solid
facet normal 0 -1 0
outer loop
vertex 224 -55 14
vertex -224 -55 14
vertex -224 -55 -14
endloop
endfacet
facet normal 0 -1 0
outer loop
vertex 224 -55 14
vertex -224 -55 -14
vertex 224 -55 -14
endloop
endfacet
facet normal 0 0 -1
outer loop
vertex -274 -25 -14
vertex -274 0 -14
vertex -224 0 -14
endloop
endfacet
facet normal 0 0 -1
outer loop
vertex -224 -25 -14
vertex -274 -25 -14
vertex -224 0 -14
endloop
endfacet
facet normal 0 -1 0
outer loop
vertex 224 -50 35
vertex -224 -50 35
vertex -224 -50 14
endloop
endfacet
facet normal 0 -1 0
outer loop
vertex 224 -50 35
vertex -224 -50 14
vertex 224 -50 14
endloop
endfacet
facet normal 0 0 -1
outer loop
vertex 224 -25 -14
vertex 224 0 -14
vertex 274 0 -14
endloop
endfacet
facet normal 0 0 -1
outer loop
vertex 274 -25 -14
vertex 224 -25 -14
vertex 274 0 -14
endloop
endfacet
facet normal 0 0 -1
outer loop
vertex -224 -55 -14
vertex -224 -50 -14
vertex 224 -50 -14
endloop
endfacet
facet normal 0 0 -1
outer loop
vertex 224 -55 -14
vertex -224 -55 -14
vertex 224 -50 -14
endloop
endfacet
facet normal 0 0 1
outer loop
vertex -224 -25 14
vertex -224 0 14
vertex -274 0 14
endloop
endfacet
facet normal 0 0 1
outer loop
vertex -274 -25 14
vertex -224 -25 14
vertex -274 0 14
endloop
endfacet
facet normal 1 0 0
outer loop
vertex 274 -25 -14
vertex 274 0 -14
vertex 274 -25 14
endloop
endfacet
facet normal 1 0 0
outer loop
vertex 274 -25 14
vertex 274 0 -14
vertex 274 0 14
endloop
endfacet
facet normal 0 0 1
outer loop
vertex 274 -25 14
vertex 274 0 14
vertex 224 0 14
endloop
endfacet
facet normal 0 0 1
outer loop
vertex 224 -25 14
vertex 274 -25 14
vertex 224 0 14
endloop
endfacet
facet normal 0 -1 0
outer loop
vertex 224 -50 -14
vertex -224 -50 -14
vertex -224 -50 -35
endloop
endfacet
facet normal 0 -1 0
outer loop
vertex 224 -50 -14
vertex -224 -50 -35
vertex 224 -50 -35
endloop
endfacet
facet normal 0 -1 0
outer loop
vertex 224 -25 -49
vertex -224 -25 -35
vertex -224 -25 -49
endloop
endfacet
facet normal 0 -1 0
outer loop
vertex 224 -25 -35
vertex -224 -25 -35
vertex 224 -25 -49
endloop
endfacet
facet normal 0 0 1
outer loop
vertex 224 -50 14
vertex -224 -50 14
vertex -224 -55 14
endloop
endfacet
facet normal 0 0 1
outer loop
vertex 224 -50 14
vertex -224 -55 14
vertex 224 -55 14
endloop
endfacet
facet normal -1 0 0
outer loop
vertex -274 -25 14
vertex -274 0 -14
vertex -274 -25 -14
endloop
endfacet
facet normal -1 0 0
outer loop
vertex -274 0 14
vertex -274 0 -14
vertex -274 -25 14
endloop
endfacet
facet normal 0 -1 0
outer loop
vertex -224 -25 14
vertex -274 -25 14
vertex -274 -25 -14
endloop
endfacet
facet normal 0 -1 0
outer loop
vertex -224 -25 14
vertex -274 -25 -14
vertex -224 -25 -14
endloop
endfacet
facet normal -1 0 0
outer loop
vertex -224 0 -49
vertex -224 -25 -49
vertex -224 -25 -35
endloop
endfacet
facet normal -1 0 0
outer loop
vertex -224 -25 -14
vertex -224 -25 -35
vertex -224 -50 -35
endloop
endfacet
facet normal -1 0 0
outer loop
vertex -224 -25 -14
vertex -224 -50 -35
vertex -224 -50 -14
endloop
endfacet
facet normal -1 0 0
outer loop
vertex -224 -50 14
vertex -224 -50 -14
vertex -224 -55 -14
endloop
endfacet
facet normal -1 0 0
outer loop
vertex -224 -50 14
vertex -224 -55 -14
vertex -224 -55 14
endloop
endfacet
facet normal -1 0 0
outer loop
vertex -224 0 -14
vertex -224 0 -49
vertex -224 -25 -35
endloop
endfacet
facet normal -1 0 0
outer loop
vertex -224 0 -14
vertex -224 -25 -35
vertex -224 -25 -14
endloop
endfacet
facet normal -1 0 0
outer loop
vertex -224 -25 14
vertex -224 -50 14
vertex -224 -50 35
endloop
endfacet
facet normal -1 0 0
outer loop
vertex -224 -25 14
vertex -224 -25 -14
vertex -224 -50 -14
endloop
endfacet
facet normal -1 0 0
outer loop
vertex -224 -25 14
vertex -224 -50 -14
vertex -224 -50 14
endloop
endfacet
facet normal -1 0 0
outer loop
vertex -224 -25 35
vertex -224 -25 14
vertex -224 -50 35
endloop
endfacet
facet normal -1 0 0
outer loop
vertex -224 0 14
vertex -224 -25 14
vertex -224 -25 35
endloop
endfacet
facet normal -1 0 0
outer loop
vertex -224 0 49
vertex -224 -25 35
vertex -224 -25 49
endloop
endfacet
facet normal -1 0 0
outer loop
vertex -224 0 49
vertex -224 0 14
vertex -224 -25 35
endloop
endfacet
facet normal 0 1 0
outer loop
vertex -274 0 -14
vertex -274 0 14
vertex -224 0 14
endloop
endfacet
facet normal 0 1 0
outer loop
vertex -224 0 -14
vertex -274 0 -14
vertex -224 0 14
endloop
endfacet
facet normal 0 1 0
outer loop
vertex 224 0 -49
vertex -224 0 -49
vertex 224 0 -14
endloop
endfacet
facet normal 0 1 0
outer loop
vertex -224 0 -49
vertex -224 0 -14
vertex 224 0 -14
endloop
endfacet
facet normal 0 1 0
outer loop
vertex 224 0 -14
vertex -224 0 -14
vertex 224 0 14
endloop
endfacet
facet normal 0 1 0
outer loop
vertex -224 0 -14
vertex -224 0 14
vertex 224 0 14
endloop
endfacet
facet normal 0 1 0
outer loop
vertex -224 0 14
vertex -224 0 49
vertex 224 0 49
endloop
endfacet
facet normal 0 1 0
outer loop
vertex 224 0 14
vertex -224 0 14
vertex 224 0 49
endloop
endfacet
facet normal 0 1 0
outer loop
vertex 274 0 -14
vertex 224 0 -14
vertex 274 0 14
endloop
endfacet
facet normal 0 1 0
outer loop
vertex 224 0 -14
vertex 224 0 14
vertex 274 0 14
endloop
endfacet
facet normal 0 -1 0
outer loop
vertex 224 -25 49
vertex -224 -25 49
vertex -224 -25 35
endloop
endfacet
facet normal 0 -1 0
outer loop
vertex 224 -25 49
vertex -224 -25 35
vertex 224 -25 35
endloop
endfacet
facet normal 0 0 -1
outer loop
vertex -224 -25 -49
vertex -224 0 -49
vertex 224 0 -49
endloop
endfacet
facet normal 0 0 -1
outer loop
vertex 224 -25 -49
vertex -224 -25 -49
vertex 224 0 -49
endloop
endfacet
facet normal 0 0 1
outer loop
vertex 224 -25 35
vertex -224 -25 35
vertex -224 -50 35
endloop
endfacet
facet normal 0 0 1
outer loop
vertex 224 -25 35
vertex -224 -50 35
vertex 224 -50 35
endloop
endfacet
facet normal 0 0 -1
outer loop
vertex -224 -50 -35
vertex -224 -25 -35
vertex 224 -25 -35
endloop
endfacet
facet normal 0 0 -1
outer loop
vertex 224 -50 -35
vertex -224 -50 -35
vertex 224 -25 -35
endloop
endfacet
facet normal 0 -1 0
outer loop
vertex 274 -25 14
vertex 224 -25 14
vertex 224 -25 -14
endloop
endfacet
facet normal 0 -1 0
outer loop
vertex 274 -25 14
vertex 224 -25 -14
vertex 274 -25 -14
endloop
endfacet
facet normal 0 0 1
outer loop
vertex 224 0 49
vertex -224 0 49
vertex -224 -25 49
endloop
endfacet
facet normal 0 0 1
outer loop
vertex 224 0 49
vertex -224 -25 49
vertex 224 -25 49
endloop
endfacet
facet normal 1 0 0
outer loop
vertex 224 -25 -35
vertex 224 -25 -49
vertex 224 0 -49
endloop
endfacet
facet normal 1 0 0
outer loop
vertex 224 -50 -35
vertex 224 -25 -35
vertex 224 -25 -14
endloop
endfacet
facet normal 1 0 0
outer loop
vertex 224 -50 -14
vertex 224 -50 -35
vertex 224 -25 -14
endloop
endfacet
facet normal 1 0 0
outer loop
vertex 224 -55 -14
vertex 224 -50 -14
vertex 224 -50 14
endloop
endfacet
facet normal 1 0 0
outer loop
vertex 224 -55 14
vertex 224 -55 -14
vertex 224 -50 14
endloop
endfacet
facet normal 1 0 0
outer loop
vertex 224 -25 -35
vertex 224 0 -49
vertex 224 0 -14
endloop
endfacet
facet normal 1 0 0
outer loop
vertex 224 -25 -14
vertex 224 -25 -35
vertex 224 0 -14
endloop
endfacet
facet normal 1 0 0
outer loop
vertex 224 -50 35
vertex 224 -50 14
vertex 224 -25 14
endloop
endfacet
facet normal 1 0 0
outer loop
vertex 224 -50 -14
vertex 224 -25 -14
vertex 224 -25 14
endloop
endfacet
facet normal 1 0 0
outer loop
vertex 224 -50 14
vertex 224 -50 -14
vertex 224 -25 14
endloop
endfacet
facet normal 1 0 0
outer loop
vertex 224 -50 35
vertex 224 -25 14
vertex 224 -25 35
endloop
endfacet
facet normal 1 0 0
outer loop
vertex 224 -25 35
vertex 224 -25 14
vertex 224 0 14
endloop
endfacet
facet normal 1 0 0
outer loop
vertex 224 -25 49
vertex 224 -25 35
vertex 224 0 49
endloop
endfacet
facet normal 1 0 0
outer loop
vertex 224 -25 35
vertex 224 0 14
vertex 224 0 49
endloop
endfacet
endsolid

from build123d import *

# Parameters (mm, degrees)
F0_W     = 448
F0_H     = 14
F0_H_2   = 21
F0_W_2   = 50
F0_H_3   = 28
F1_DEPTH = 25
F2_W     = 448
F2_H     = 21
F3_DEPTH = 25
F4_W     = 448
F4_H     = 28
F5_DEPTH = 30


with BuildPart() as f1:
    # F0 (on Front) → F1 (new body)
    with BuildSketch(Plane.XZ):
        with Locations((0, -42)):
            Rectangle(F0_W, F0_H)
        with Locations((0, -24.5)):
            Rectangle(F0_W, F0_H_2)
        with Locations((249, 0)):
            Rectangle(F0_W_2, F0_H_3)
        Rectangle(F0_W, F0_H_3)
        with Locations((-249, 0)):
            Rectangle(F0_W_2, F0_H_3)
        with Locations((0, 24.5)):
            Rectangle(F0_W, F0_H_2)
        with Locations((0, 42)):
            Rectangle(F0_W, F0_H)
    extrude(amount=F1_DEPTH)

    # F2 (on face) → F3 (join)
    with BuildSketch(Plane.XZ.offset(25)):
        with Locations((0, 24.5)):
            Rectangle(F2_W, F2_H)
        with Locations((0, -24.5)):
            Rectangle(F2_W, F2_H)
    extrude(amount=F3_DEPTH)

    # F4 (on face) → F5 (join)
    with BuildSketch(Plane.XZ.offset(25)):
        Rectangle(F4_W, F4_H)
    extrude(amount=F5_DEPTH)


solid = f1.part
